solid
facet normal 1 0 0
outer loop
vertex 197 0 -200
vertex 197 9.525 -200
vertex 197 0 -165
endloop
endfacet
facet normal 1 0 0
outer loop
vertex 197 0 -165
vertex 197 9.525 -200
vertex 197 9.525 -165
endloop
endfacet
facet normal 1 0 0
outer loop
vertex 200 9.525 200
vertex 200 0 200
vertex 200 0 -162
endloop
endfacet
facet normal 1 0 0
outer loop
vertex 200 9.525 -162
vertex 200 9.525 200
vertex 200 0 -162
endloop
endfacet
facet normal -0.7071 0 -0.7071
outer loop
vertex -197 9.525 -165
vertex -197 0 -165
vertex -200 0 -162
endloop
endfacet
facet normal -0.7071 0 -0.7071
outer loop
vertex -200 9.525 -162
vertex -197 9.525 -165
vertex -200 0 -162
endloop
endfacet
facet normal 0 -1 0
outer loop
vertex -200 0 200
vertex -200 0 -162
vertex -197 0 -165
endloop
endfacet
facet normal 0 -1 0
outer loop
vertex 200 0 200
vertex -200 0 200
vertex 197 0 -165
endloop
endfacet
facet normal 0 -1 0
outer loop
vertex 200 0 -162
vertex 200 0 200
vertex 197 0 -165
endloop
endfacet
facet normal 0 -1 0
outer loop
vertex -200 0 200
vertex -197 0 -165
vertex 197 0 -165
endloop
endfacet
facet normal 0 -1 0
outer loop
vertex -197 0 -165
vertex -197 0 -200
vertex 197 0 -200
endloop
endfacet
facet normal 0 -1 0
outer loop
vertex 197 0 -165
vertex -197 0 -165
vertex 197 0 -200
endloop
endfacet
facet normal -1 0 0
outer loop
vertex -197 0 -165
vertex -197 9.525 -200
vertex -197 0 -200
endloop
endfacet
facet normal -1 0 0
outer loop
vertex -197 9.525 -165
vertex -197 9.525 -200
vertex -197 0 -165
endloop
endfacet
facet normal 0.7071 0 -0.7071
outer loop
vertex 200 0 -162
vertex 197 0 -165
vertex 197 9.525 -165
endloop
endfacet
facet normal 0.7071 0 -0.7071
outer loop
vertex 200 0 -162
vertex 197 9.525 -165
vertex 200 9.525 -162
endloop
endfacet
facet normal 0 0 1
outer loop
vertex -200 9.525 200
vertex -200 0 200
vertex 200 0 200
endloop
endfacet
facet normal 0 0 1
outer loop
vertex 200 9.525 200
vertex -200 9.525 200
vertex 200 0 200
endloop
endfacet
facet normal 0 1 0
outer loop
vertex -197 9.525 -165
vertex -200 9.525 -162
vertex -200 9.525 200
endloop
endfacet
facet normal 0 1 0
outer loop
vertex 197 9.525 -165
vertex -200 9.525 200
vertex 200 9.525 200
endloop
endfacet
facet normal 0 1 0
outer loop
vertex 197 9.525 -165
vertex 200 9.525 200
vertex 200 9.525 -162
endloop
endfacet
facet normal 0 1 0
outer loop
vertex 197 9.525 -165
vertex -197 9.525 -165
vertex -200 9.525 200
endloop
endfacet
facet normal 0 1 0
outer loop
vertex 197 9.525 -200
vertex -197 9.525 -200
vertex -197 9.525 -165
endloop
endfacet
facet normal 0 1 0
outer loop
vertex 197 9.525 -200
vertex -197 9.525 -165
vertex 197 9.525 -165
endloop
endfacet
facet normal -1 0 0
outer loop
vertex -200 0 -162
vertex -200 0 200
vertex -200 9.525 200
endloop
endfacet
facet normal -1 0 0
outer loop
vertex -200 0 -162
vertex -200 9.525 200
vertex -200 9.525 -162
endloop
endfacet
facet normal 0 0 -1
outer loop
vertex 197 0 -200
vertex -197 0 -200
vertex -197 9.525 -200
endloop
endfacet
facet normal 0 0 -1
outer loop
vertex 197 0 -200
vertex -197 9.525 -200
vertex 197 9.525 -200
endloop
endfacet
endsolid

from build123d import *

# Parameters (mm, degrees)
SKETCH1_W           = 400
SKETCH1_H           = 400
BOSS_EXTRUDE1_DEPTH = 9.525
CUT_EXTRUDE1_DEPTH  = 10.525


with BuildPart() as part:
    # Sketch1 → Boss-Extrude1 (new body)
    with BuildSketch(Plane(origin=(0, 0, 0), x_dir=(1, 0, 0), z_dir=(0, 1, 0))):
        Rectangle(SKETCH1_W, SKETCH1_H)
    extrude(amount=BOSS_EXTRUDE1_DEPTH)

    # Sketch2 → Cut-Extrude1 (cut, through all)
    with BuildSketch(Plane(origin=(0, 9.525, 0), x_dir=(1, 0, 0), z_dir=(0, 1, 0))):
        Polygon((197, 200), (197, 165), (200, 162), (200, 200), align=None)
    cut_extrude1 = extrude(amount=-CUT_EXTRUDE1_DEPTH, mode=Mode.SUBTRACT)

    # Mirror1: Cut-Extrude1 across plane
    add(cut_extrude1.mirror(Plane(origin=(0, 0, 0), x_dir=(0, 0, 1), z_dir=(1, 0, 0))), mode=Mode.SUBTRACT)


solid = part.part
